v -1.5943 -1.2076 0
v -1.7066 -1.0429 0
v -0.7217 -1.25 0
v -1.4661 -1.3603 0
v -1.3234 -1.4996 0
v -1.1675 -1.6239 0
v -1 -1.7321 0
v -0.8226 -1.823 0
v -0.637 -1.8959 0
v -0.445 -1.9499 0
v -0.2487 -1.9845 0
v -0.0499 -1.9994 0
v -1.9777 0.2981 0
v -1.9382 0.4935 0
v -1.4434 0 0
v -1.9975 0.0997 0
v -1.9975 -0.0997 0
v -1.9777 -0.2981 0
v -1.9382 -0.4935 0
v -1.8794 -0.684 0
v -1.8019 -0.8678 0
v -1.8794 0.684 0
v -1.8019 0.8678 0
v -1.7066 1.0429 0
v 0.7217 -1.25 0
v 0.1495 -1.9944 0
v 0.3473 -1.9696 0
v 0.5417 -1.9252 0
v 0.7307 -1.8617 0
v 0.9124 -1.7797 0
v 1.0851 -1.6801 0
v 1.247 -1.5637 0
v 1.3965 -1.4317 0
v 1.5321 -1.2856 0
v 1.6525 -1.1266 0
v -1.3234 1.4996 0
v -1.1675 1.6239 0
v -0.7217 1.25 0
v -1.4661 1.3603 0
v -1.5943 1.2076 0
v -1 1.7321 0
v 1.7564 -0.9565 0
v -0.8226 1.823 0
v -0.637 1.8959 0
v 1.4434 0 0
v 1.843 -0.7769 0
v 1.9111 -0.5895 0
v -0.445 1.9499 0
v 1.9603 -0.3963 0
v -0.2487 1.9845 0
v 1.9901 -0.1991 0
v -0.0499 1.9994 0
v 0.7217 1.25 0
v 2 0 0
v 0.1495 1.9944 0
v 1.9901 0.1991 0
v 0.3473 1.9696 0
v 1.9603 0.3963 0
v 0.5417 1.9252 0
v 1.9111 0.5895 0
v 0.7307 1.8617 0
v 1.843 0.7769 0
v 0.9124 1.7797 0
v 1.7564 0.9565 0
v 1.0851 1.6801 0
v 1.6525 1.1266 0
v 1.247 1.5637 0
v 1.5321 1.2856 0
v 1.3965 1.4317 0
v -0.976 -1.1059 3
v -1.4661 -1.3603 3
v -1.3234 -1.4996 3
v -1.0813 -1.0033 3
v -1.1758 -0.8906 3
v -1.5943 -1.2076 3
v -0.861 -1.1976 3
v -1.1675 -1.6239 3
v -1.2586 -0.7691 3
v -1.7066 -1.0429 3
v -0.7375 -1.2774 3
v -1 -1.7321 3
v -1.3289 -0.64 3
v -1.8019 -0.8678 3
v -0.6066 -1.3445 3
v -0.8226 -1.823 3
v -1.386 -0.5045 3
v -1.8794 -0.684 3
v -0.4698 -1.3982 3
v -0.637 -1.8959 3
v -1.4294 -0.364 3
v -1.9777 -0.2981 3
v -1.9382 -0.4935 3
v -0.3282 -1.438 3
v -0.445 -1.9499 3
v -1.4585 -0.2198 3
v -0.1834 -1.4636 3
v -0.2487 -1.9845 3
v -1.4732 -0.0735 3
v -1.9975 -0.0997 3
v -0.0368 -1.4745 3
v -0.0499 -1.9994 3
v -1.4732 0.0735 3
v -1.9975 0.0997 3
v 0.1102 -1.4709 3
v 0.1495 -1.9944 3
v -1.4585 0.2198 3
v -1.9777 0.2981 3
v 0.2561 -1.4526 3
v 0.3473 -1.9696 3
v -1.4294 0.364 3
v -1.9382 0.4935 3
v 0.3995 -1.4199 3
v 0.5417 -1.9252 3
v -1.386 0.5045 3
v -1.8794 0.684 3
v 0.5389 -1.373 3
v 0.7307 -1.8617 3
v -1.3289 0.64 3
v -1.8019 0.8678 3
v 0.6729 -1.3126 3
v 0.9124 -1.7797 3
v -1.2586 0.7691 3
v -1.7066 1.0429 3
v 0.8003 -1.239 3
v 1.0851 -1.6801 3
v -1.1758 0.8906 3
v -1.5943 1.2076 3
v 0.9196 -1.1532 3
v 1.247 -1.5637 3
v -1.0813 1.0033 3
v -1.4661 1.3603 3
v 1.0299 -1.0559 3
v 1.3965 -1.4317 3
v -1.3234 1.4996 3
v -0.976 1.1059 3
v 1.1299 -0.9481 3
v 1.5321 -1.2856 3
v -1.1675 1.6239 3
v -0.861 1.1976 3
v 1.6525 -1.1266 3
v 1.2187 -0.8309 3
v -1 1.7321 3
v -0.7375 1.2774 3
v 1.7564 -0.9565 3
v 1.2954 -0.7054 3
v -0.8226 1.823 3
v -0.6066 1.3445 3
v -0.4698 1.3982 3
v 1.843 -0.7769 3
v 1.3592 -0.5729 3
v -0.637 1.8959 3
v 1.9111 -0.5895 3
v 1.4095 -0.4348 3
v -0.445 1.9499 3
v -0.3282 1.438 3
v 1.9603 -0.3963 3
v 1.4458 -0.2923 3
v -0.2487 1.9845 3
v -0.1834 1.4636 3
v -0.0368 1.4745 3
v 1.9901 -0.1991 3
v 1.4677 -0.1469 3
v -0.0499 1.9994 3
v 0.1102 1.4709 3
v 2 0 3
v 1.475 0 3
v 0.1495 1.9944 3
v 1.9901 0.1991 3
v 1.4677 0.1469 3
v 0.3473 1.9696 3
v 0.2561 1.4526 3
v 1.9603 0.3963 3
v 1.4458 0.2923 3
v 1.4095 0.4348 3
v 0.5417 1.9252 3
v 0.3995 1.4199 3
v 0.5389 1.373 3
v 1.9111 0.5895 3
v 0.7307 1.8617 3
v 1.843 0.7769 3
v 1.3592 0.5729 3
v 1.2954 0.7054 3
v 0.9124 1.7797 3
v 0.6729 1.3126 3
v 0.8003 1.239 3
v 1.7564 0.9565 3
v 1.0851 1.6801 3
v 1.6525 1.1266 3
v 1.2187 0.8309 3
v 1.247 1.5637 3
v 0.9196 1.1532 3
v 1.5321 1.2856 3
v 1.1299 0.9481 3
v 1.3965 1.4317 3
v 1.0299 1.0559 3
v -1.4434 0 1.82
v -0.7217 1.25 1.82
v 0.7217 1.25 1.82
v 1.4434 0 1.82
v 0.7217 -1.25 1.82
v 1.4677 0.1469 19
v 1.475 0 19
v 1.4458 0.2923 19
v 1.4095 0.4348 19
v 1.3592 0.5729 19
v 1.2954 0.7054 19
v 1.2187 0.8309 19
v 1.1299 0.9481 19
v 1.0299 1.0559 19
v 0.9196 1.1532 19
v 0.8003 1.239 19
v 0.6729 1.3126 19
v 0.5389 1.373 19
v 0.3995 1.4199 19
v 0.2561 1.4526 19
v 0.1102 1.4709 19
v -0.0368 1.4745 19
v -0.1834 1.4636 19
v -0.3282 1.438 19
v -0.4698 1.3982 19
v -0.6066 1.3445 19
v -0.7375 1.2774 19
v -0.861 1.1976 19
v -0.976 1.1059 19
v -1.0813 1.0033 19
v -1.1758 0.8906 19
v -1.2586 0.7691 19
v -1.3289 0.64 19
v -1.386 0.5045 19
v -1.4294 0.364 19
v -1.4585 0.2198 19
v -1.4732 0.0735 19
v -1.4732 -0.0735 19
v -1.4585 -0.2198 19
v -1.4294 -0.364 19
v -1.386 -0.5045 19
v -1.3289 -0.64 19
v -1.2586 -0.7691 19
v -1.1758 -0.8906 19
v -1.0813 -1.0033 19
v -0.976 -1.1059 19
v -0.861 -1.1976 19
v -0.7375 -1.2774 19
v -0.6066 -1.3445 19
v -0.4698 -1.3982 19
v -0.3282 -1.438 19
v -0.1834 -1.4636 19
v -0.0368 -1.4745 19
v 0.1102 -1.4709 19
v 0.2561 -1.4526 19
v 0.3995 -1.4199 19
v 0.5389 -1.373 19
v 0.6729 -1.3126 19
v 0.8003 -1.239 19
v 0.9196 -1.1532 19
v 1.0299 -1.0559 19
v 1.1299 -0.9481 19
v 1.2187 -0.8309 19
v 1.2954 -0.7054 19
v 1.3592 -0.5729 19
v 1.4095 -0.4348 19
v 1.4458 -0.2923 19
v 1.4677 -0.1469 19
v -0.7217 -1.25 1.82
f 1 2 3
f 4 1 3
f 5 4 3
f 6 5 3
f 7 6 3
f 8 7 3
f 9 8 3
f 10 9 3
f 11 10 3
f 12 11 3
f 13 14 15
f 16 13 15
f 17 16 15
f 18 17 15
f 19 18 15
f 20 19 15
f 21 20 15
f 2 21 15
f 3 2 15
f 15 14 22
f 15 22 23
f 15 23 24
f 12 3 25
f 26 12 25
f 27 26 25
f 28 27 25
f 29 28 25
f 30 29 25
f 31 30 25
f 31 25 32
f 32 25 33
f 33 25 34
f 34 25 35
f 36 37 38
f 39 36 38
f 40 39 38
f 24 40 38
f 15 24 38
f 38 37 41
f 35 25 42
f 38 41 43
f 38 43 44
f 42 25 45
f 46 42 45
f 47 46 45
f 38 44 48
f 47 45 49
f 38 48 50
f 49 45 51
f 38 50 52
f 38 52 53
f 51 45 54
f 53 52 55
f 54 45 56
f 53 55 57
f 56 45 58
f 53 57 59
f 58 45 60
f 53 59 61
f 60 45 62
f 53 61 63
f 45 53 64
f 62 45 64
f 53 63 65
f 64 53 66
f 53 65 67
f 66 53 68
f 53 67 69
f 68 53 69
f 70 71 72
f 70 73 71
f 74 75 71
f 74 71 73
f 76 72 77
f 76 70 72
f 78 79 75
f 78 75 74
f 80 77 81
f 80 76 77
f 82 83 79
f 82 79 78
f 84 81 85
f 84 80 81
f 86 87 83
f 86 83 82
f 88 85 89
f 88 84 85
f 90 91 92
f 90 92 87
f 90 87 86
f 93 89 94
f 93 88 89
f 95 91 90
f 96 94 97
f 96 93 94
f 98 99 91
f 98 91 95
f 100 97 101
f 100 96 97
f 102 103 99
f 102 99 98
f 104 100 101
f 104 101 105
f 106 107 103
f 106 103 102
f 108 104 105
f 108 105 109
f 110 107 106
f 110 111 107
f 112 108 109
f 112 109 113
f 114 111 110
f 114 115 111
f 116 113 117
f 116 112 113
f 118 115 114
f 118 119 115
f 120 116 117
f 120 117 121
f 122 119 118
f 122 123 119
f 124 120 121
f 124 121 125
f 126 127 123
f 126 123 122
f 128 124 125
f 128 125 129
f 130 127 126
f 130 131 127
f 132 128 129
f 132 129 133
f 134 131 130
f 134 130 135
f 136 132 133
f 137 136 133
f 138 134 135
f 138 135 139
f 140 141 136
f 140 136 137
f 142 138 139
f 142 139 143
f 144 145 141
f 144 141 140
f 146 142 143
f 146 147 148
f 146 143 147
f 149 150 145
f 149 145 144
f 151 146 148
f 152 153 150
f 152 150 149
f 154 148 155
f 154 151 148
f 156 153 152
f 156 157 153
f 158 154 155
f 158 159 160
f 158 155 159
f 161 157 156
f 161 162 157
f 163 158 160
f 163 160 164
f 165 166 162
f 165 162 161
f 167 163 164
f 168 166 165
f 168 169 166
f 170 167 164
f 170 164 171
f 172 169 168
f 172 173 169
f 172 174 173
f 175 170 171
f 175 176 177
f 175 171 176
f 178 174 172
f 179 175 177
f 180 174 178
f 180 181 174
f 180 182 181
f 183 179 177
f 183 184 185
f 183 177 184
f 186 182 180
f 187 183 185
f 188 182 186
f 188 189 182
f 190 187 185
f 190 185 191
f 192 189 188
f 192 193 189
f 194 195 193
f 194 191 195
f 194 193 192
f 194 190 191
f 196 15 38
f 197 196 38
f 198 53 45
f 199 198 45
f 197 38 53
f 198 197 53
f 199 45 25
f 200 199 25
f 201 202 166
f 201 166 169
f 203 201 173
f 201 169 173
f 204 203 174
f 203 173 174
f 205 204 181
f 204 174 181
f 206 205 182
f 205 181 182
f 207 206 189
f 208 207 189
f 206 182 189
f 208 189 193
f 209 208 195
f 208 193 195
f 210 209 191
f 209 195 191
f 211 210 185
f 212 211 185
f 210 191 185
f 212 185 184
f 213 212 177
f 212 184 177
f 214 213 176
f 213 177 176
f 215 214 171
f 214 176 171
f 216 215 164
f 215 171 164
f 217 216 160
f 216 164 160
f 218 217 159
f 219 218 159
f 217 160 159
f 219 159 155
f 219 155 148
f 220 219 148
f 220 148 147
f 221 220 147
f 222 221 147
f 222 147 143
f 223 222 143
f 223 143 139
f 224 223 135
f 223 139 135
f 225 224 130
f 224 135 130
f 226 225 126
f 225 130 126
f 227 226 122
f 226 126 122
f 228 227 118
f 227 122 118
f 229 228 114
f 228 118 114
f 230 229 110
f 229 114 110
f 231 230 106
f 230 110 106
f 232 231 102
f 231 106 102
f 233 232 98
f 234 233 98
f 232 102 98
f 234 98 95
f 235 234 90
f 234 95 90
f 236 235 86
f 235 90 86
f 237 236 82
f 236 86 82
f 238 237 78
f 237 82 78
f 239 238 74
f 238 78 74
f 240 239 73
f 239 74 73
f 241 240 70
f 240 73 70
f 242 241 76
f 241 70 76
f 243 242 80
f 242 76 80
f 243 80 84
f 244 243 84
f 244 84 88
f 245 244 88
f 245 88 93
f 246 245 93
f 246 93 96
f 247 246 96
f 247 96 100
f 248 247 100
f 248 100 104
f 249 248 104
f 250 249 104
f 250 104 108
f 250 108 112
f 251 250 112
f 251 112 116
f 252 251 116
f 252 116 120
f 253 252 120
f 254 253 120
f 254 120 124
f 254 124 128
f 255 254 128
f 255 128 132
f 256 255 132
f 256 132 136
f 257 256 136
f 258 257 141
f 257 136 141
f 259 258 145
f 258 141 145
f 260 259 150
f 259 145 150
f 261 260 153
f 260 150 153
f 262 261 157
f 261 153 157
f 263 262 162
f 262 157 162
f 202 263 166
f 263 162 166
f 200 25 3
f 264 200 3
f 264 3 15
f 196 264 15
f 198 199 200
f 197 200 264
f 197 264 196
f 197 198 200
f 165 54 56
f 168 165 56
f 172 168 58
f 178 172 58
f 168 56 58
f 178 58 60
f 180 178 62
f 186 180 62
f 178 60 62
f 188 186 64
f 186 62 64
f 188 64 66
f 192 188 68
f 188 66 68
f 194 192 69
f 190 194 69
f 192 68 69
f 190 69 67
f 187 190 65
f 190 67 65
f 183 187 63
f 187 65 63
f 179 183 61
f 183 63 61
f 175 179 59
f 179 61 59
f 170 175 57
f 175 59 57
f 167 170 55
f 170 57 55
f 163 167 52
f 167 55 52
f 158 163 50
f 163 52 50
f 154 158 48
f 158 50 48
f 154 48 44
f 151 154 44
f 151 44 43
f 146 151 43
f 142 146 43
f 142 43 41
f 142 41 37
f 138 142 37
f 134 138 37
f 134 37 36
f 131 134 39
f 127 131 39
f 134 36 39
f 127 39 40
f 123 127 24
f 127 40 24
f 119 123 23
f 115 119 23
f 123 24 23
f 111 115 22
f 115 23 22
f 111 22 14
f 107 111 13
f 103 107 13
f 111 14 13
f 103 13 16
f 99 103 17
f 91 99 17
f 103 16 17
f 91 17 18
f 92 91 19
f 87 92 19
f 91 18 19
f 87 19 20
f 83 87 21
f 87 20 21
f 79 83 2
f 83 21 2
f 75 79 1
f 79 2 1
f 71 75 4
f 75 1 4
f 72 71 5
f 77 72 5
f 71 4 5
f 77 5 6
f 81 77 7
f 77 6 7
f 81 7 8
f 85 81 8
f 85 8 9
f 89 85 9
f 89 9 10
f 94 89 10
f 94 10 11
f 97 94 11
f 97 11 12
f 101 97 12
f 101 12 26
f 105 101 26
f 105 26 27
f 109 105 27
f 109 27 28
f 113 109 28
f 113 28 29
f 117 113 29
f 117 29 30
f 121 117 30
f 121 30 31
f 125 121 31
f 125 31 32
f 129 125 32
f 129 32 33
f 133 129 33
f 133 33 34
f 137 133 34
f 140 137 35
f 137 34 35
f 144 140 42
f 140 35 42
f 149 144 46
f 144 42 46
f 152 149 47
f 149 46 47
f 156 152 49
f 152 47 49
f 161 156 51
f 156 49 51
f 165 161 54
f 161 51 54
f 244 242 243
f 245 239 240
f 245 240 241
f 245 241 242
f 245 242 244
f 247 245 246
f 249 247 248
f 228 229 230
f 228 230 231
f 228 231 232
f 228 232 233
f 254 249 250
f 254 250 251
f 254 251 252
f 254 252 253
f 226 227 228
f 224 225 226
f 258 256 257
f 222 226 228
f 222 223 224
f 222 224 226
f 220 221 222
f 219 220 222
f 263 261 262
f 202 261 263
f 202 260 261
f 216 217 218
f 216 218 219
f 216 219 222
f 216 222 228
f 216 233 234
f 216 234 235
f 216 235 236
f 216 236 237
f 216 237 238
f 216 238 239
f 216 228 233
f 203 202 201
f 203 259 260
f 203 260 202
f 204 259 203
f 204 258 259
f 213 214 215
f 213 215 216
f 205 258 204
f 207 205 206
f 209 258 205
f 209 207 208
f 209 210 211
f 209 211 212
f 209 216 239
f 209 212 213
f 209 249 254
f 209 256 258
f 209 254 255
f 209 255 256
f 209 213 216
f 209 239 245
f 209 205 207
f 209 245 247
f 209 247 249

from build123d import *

# Parameters (mm, degrees)
SKETCH1_R      = 2
EXTRUDE1_DEPTH = 3
EXTRUDE3_DEPTH = 1.82
SKETCH2_R      = 1.475
EXTRUDE2_DEPTH = 16


with BuildPart() as part:
    # Sketch1 → Extrude1 (new body)
    with BuildSketch(Plane.XY):
        Circle(SKETCH1_R)
    extrude(amount=EXTRUDE1_DEPTH)

    # Sketch3 → Extrude3 (cut)
    with BuildSketch(Plane(origin=(0, 0, 0), x_dir=(-1, 0, 0), z_dir=(0, 0, -1))):
        Polygon((-1.443375673, 0), (-0.721687836, -1.25), (0.721687836, -1.25), (1.443375673, 0), (0.721687836, 1.25), (-0.721687836, 1.25), align=None)
    extrude(amount=-EXTRUDE3_DEPTH, mode=Mode.SUBTRACT)

    # Sketch2 → Extrude2 (add)
    with BuildSketch(Plane.XY.offset(3)):
        Circle(SKETCH2_R)
    extrude(amount=EXTRUDE2_DEPTH)


solid = part.part
